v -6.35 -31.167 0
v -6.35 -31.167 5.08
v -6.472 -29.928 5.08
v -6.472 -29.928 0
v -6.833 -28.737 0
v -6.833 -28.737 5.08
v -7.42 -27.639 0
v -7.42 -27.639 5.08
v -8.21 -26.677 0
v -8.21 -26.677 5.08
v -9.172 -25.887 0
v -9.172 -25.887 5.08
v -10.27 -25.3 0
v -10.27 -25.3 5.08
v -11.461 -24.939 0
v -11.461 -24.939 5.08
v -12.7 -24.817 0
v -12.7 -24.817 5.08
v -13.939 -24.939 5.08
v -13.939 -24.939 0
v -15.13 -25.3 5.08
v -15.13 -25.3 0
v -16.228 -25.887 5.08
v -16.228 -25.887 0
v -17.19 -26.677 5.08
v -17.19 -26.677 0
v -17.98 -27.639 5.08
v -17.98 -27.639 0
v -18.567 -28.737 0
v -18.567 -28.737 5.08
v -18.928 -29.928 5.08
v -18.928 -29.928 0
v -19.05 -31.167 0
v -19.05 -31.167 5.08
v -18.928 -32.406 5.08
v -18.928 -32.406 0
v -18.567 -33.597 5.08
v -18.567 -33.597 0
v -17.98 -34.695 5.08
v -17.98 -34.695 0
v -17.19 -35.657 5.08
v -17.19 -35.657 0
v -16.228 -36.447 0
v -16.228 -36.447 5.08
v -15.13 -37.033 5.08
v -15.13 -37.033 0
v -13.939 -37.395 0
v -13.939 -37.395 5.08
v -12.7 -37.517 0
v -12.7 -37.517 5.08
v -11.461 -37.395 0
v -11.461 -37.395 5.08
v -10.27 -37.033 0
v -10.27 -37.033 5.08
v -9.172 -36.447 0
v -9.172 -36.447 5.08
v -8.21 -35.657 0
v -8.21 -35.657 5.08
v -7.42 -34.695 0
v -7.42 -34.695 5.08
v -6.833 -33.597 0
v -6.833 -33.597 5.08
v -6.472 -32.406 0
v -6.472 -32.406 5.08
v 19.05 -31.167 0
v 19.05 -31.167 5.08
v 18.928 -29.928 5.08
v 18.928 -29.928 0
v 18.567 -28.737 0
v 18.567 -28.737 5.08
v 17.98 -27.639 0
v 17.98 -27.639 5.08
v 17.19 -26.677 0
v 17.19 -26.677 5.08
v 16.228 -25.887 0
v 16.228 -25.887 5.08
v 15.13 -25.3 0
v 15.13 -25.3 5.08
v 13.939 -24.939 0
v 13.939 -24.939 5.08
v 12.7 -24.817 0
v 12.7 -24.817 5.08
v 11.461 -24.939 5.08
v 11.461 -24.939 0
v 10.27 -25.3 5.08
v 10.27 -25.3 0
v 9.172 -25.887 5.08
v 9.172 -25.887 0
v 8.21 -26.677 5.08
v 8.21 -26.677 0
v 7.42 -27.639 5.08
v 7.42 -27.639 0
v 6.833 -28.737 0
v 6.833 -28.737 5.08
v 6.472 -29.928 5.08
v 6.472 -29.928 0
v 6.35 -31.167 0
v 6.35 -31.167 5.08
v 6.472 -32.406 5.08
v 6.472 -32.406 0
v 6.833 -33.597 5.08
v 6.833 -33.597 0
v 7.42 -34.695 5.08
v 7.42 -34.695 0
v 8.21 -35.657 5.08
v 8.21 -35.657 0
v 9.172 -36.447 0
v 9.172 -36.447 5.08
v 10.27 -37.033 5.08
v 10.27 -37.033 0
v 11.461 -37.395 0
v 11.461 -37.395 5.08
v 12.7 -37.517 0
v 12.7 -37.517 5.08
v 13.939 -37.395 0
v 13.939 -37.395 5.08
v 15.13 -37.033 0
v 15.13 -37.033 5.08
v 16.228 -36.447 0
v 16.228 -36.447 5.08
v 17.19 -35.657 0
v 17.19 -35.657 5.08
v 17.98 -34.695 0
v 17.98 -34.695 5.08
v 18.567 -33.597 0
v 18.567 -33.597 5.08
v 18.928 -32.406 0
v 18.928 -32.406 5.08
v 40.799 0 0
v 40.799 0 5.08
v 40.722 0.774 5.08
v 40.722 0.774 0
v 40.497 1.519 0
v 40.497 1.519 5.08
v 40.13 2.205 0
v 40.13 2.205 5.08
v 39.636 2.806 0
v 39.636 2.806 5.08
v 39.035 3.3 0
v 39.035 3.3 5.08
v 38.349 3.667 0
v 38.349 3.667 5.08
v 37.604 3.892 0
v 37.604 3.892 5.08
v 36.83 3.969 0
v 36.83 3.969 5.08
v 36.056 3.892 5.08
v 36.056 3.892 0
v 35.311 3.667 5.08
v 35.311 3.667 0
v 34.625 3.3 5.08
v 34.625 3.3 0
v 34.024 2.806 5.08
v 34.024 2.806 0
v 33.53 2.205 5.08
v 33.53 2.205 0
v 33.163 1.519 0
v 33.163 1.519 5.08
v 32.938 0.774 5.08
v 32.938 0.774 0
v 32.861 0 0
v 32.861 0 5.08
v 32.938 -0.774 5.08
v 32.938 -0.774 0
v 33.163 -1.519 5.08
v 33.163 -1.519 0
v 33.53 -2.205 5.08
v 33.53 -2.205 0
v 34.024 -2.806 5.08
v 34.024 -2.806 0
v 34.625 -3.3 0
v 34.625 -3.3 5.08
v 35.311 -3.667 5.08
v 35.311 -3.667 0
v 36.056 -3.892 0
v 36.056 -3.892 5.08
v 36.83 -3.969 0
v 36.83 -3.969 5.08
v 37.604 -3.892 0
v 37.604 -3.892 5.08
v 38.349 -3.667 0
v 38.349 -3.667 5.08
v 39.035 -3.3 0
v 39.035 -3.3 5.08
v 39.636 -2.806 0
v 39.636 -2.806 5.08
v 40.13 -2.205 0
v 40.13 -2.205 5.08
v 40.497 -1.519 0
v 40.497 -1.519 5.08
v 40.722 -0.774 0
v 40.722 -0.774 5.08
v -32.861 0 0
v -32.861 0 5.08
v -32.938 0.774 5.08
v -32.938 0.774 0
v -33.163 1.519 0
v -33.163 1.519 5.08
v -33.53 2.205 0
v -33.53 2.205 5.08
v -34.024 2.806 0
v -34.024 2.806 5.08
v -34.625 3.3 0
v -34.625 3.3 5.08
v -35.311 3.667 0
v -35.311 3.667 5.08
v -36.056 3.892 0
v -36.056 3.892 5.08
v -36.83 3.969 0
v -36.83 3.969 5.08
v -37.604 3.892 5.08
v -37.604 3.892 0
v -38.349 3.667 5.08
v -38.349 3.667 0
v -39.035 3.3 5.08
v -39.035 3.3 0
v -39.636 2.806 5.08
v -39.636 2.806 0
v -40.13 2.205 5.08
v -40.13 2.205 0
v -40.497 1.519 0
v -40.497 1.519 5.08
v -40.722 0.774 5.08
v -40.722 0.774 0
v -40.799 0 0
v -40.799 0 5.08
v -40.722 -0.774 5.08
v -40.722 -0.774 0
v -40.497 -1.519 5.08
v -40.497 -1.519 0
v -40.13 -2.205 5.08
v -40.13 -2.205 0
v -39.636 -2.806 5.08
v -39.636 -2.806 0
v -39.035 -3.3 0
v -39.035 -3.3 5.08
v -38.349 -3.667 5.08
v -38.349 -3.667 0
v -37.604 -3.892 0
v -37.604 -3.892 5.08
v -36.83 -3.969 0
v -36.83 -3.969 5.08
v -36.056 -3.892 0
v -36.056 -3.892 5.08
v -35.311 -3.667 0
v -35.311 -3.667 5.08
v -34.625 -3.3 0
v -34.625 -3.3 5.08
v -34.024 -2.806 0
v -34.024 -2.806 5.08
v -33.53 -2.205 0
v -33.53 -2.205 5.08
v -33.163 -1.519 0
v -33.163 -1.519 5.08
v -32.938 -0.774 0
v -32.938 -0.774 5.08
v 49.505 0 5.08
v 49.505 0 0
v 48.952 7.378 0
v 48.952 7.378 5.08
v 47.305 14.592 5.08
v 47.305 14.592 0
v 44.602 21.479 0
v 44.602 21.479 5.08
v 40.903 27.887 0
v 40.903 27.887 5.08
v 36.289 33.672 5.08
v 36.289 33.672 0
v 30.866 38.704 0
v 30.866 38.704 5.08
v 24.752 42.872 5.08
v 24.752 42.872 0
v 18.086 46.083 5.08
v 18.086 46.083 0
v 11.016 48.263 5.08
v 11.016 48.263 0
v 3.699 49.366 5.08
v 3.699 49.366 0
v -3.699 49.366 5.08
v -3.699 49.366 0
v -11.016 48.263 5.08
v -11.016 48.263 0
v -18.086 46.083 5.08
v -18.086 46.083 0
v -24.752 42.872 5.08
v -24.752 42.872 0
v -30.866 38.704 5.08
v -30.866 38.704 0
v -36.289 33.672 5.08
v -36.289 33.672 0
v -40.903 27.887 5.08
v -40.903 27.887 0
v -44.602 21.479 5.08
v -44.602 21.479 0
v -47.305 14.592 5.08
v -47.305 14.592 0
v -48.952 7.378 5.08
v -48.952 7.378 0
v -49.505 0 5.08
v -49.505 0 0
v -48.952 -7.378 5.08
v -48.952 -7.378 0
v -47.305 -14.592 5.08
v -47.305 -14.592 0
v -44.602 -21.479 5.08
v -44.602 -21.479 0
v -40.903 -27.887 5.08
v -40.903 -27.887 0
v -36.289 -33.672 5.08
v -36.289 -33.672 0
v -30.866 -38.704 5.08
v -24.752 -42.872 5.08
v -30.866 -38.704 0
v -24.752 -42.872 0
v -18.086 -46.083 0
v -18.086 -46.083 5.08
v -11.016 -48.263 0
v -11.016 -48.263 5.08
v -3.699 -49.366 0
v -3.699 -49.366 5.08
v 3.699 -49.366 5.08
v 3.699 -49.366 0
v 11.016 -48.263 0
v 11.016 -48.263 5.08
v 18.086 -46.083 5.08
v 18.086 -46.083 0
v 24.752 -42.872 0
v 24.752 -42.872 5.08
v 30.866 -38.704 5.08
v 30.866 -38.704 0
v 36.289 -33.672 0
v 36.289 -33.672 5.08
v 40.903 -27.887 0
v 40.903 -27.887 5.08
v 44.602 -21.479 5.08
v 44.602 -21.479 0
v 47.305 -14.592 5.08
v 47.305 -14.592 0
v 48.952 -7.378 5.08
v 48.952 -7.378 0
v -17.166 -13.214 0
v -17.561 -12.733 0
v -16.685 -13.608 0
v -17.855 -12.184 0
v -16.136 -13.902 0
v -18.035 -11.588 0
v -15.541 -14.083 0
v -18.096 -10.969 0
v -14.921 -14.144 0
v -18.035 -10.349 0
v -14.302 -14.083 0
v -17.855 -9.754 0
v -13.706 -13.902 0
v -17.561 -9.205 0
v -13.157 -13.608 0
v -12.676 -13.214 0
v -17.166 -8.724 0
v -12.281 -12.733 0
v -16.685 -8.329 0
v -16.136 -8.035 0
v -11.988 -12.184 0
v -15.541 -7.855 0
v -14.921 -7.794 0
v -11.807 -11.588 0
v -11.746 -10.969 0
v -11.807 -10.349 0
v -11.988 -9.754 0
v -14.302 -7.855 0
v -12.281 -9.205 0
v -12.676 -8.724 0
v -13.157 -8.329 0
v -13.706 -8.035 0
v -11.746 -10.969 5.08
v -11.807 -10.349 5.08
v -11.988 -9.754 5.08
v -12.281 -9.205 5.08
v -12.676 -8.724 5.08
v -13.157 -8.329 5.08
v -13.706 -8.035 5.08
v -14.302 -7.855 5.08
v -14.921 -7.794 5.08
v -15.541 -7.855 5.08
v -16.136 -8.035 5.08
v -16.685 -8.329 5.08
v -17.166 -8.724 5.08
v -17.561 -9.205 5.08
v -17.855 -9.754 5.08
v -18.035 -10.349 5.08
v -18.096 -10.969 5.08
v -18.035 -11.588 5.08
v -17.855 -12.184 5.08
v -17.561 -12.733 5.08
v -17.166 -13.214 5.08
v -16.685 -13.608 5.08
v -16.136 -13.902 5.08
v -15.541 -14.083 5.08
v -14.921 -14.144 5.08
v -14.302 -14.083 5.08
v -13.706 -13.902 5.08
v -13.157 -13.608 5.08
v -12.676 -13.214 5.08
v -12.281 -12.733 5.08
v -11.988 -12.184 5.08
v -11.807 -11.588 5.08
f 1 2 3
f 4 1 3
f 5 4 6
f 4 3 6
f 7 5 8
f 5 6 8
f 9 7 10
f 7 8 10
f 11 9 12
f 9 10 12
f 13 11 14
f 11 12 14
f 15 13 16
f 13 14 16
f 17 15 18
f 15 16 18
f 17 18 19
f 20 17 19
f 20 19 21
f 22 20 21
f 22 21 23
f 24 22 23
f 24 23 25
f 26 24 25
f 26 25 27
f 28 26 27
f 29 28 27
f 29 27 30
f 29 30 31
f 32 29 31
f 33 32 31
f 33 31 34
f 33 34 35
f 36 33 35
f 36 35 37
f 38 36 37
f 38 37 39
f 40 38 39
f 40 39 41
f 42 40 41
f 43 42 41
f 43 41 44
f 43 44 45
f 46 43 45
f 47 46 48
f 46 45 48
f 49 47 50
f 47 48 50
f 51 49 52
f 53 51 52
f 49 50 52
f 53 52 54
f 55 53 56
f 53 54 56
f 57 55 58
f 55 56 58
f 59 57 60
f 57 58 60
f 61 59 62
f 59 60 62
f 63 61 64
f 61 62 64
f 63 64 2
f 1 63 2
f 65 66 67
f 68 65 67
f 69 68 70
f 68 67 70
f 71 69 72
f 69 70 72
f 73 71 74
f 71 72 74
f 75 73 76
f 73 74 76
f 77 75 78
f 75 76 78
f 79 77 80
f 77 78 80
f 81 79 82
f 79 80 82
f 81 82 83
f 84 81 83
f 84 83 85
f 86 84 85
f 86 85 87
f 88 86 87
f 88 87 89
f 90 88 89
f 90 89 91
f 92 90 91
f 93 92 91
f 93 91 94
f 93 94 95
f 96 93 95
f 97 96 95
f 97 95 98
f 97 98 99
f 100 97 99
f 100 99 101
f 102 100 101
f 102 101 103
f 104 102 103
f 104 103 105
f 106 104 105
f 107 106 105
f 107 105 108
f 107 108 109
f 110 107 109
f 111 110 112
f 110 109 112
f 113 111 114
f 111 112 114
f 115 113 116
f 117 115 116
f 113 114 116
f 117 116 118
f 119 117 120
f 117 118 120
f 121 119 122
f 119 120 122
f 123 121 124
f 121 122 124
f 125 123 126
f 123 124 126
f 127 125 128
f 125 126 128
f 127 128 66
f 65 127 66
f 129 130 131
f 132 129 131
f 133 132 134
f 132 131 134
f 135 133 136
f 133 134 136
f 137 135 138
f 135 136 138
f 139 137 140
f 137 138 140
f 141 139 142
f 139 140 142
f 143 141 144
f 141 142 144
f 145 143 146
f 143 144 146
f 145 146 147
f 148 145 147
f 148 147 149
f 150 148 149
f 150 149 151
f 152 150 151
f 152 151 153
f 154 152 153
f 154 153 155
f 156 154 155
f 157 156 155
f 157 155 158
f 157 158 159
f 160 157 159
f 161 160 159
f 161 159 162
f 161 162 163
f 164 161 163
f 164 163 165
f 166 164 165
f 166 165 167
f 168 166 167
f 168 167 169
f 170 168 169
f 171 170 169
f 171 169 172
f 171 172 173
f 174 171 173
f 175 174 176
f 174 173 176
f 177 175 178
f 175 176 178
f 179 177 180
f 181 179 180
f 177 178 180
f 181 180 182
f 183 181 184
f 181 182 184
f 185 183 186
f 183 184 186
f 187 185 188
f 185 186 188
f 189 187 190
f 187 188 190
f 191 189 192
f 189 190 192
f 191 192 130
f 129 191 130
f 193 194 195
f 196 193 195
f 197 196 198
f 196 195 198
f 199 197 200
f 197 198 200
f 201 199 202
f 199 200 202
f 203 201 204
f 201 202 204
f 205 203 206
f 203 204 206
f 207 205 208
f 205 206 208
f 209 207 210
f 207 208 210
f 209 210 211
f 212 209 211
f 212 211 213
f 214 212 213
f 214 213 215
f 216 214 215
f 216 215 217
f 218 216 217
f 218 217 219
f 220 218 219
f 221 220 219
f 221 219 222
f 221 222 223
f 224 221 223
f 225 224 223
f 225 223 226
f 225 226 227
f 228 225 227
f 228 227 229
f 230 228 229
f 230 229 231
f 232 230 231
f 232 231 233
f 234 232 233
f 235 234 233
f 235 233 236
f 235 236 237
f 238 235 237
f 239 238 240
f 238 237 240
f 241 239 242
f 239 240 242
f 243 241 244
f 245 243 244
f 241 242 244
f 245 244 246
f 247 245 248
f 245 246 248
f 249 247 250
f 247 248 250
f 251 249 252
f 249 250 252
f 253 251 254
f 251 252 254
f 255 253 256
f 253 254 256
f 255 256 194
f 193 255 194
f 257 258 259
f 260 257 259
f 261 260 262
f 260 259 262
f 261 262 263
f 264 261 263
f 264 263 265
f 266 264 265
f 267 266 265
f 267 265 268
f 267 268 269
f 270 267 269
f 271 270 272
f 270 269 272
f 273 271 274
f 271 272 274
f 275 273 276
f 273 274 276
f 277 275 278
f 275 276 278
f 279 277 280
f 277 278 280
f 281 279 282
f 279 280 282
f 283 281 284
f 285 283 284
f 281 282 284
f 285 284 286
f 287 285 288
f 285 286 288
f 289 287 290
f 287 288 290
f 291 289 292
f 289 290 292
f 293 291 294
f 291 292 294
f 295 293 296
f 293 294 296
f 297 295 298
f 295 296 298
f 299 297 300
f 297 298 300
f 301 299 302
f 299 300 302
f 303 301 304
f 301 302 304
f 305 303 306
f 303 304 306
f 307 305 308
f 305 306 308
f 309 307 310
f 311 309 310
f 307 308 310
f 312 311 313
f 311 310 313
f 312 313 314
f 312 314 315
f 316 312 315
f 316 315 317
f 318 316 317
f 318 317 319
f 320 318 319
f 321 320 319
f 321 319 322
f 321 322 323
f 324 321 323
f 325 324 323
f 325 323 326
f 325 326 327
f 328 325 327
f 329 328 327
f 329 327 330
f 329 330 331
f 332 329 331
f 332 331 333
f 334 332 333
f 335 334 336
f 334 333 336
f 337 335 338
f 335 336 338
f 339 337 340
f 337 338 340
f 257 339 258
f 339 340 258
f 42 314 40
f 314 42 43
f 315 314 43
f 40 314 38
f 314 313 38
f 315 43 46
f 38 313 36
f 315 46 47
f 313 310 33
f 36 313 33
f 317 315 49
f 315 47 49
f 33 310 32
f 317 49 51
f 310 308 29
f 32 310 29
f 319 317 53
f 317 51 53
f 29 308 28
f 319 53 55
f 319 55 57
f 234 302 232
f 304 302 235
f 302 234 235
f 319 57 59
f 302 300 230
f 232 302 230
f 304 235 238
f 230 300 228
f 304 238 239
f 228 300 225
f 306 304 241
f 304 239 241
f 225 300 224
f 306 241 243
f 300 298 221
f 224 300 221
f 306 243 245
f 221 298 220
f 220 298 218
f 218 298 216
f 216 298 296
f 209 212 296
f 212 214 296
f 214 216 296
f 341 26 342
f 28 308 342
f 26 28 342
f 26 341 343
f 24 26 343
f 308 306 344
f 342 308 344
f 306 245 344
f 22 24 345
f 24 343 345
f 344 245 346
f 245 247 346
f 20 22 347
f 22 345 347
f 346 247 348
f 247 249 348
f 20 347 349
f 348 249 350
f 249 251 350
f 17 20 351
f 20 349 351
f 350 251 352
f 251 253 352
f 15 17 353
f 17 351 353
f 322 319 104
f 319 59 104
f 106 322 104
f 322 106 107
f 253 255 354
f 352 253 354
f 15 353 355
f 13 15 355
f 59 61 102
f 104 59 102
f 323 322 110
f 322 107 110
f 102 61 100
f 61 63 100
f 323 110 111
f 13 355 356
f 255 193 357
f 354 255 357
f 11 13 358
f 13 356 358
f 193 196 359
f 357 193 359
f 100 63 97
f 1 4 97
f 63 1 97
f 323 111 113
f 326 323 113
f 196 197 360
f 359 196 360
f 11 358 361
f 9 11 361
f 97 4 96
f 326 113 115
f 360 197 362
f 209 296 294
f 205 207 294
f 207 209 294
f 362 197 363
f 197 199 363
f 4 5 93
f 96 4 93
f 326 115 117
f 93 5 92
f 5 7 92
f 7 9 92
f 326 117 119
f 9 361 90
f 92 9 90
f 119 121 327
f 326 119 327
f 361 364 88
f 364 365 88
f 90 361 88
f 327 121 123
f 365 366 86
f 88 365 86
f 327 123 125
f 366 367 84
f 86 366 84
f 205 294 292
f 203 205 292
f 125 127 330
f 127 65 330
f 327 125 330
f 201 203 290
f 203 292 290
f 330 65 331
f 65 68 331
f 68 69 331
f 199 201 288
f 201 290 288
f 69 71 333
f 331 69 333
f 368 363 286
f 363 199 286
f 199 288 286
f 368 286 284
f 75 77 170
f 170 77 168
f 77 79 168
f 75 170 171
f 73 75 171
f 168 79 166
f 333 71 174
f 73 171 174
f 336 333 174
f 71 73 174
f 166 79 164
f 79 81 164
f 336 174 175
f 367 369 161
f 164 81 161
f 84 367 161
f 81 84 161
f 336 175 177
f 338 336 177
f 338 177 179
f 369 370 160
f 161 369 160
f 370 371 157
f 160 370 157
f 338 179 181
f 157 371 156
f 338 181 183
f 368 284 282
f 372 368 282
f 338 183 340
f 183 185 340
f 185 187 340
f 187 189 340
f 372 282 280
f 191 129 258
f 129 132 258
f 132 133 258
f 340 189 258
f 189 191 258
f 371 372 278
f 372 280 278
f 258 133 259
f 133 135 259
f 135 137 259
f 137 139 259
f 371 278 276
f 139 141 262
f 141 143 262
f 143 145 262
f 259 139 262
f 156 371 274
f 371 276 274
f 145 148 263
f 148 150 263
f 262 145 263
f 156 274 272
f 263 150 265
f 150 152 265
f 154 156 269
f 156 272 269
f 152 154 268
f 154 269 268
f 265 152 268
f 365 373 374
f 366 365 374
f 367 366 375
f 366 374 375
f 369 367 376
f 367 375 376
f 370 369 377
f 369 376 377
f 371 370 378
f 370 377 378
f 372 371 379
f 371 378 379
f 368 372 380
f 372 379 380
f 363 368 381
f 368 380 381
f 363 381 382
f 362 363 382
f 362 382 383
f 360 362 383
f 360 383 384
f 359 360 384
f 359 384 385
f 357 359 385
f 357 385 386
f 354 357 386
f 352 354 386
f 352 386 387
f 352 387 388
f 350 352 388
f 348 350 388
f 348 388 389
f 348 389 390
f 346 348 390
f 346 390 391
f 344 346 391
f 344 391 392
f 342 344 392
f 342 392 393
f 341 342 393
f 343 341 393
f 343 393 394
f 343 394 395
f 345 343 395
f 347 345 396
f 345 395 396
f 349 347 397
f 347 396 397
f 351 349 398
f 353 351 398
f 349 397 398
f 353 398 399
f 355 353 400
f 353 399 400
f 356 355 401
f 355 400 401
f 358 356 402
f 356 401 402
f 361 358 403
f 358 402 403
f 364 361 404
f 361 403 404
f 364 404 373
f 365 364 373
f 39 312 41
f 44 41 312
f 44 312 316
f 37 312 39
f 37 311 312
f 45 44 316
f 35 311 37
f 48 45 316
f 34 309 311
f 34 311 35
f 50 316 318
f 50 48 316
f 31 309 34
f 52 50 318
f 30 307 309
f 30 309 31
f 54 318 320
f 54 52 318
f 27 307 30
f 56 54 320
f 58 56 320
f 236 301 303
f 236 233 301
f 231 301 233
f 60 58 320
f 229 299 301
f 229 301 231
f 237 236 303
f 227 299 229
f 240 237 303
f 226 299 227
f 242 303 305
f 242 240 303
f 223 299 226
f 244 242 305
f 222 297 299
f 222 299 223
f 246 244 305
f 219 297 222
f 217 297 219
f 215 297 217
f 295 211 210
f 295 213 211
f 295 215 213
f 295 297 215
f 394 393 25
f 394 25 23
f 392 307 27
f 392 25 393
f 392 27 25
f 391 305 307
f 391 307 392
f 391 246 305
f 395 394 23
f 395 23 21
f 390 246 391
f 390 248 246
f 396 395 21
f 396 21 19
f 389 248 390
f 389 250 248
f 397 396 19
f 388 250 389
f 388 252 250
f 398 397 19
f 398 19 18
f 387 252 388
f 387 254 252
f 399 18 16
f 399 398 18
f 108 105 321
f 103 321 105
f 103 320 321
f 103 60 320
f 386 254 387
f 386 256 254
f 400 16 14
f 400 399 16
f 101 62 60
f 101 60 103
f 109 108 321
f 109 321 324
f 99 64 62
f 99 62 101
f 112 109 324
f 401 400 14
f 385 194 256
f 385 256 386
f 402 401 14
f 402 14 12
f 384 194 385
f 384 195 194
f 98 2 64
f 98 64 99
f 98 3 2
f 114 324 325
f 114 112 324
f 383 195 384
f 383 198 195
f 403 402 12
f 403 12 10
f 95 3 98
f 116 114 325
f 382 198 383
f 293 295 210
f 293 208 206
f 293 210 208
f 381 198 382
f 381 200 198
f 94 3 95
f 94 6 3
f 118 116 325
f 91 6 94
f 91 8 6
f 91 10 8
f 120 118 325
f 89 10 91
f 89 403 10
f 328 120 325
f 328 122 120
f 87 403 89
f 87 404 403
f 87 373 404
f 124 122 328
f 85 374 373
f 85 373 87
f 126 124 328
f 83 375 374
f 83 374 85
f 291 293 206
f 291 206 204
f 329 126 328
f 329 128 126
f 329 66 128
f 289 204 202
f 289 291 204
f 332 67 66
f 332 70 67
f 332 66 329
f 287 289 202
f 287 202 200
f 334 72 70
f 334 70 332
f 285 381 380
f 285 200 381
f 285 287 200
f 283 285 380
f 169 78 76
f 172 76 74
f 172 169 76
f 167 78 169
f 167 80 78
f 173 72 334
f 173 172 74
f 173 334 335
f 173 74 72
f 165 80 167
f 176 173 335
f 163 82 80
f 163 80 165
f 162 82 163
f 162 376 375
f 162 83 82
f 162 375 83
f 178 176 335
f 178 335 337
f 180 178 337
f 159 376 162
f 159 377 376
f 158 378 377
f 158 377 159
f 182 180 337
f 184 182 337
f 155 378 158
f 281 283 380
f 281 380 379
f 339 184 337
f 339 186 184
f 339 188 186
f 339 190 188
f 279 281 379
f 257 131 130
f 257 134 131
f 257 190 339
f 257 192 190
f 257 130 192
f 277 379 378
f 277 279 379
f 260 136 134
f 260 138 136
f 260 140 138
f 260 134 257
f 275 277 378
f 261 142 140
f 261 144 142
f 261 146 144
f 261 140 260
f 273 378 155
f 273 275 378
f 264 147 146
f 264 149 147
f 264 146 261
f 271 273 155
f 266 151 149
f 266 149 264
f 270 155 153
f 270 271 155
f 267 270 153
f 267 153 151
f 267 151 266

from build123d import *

# Parameters (mm, degrees)
SKETCH1_R           = 49.5046
BOSS_EXTRUDE1_DEPTH = 5.08
SKETCH2_R           = 47.625
BOSS_EXTRUDE2_DEPTH = 3.175
SKETCH3_R           = 6.35
SKETCH3_R_2         = 3.96875
SKETCH3_R_3         = 3.175
CUT_EXTRUDE1_DEPTH  = 9.255
SKETCH4_R           = 53.657769874
CUT_EXTRUDE2_DEPTH  = 3.175


with BuildPart() as part:
    # Sketch1 → Boss-Extrude1 (new body)
    with BuildSketch(Plane.XY):
        Circle(SKETCH1_R)
    extrude(amount=BOSS_EXTRUDE1_DEPTH)

    # Sketch2 → Boss-Extrude2 (add)
    with BuildSketch(Plane.XY.offset(5.08)):
        Circle(SKETCH2_R)
    extrude(amount=BOSS_EXTRUDE2_DEPTH)

    # Sketch3 → Cut-Extrude1 (cut, through all)
    with BuildSketch(Plane.XY.offset(8.255)):
        with Locations((-12.7, -31.166793627)):
            Circle(SKETCH3_R)
        with Locations((12.7, -31.166793627)):
            Circle(SKETCH3_R)
        with Locations((-36.83, 0)):
            Circle(SKETCH3_R_2)
        with Locations((36.83, 0)):
            Circle(SKETCH3_R_2)
        with Locations((-14.921345457, -10.968575281)):
            Circle(SKETCH3_R_3)
    extrude(amount=-CUT_EXTRUDE1_DEPTH, mode=Mode.SUBTRACT)

    # Sketch4 → Cut-Extrude2 (cut)
    with BuildSketch(Plane.XY.offset(8.255)):
        Circle(SKETCH4_R)
    extrude(amount=-CUT_EXTRUDE2_DEPTH, mode=Mode.SUBTRACT)


solid = part.part
